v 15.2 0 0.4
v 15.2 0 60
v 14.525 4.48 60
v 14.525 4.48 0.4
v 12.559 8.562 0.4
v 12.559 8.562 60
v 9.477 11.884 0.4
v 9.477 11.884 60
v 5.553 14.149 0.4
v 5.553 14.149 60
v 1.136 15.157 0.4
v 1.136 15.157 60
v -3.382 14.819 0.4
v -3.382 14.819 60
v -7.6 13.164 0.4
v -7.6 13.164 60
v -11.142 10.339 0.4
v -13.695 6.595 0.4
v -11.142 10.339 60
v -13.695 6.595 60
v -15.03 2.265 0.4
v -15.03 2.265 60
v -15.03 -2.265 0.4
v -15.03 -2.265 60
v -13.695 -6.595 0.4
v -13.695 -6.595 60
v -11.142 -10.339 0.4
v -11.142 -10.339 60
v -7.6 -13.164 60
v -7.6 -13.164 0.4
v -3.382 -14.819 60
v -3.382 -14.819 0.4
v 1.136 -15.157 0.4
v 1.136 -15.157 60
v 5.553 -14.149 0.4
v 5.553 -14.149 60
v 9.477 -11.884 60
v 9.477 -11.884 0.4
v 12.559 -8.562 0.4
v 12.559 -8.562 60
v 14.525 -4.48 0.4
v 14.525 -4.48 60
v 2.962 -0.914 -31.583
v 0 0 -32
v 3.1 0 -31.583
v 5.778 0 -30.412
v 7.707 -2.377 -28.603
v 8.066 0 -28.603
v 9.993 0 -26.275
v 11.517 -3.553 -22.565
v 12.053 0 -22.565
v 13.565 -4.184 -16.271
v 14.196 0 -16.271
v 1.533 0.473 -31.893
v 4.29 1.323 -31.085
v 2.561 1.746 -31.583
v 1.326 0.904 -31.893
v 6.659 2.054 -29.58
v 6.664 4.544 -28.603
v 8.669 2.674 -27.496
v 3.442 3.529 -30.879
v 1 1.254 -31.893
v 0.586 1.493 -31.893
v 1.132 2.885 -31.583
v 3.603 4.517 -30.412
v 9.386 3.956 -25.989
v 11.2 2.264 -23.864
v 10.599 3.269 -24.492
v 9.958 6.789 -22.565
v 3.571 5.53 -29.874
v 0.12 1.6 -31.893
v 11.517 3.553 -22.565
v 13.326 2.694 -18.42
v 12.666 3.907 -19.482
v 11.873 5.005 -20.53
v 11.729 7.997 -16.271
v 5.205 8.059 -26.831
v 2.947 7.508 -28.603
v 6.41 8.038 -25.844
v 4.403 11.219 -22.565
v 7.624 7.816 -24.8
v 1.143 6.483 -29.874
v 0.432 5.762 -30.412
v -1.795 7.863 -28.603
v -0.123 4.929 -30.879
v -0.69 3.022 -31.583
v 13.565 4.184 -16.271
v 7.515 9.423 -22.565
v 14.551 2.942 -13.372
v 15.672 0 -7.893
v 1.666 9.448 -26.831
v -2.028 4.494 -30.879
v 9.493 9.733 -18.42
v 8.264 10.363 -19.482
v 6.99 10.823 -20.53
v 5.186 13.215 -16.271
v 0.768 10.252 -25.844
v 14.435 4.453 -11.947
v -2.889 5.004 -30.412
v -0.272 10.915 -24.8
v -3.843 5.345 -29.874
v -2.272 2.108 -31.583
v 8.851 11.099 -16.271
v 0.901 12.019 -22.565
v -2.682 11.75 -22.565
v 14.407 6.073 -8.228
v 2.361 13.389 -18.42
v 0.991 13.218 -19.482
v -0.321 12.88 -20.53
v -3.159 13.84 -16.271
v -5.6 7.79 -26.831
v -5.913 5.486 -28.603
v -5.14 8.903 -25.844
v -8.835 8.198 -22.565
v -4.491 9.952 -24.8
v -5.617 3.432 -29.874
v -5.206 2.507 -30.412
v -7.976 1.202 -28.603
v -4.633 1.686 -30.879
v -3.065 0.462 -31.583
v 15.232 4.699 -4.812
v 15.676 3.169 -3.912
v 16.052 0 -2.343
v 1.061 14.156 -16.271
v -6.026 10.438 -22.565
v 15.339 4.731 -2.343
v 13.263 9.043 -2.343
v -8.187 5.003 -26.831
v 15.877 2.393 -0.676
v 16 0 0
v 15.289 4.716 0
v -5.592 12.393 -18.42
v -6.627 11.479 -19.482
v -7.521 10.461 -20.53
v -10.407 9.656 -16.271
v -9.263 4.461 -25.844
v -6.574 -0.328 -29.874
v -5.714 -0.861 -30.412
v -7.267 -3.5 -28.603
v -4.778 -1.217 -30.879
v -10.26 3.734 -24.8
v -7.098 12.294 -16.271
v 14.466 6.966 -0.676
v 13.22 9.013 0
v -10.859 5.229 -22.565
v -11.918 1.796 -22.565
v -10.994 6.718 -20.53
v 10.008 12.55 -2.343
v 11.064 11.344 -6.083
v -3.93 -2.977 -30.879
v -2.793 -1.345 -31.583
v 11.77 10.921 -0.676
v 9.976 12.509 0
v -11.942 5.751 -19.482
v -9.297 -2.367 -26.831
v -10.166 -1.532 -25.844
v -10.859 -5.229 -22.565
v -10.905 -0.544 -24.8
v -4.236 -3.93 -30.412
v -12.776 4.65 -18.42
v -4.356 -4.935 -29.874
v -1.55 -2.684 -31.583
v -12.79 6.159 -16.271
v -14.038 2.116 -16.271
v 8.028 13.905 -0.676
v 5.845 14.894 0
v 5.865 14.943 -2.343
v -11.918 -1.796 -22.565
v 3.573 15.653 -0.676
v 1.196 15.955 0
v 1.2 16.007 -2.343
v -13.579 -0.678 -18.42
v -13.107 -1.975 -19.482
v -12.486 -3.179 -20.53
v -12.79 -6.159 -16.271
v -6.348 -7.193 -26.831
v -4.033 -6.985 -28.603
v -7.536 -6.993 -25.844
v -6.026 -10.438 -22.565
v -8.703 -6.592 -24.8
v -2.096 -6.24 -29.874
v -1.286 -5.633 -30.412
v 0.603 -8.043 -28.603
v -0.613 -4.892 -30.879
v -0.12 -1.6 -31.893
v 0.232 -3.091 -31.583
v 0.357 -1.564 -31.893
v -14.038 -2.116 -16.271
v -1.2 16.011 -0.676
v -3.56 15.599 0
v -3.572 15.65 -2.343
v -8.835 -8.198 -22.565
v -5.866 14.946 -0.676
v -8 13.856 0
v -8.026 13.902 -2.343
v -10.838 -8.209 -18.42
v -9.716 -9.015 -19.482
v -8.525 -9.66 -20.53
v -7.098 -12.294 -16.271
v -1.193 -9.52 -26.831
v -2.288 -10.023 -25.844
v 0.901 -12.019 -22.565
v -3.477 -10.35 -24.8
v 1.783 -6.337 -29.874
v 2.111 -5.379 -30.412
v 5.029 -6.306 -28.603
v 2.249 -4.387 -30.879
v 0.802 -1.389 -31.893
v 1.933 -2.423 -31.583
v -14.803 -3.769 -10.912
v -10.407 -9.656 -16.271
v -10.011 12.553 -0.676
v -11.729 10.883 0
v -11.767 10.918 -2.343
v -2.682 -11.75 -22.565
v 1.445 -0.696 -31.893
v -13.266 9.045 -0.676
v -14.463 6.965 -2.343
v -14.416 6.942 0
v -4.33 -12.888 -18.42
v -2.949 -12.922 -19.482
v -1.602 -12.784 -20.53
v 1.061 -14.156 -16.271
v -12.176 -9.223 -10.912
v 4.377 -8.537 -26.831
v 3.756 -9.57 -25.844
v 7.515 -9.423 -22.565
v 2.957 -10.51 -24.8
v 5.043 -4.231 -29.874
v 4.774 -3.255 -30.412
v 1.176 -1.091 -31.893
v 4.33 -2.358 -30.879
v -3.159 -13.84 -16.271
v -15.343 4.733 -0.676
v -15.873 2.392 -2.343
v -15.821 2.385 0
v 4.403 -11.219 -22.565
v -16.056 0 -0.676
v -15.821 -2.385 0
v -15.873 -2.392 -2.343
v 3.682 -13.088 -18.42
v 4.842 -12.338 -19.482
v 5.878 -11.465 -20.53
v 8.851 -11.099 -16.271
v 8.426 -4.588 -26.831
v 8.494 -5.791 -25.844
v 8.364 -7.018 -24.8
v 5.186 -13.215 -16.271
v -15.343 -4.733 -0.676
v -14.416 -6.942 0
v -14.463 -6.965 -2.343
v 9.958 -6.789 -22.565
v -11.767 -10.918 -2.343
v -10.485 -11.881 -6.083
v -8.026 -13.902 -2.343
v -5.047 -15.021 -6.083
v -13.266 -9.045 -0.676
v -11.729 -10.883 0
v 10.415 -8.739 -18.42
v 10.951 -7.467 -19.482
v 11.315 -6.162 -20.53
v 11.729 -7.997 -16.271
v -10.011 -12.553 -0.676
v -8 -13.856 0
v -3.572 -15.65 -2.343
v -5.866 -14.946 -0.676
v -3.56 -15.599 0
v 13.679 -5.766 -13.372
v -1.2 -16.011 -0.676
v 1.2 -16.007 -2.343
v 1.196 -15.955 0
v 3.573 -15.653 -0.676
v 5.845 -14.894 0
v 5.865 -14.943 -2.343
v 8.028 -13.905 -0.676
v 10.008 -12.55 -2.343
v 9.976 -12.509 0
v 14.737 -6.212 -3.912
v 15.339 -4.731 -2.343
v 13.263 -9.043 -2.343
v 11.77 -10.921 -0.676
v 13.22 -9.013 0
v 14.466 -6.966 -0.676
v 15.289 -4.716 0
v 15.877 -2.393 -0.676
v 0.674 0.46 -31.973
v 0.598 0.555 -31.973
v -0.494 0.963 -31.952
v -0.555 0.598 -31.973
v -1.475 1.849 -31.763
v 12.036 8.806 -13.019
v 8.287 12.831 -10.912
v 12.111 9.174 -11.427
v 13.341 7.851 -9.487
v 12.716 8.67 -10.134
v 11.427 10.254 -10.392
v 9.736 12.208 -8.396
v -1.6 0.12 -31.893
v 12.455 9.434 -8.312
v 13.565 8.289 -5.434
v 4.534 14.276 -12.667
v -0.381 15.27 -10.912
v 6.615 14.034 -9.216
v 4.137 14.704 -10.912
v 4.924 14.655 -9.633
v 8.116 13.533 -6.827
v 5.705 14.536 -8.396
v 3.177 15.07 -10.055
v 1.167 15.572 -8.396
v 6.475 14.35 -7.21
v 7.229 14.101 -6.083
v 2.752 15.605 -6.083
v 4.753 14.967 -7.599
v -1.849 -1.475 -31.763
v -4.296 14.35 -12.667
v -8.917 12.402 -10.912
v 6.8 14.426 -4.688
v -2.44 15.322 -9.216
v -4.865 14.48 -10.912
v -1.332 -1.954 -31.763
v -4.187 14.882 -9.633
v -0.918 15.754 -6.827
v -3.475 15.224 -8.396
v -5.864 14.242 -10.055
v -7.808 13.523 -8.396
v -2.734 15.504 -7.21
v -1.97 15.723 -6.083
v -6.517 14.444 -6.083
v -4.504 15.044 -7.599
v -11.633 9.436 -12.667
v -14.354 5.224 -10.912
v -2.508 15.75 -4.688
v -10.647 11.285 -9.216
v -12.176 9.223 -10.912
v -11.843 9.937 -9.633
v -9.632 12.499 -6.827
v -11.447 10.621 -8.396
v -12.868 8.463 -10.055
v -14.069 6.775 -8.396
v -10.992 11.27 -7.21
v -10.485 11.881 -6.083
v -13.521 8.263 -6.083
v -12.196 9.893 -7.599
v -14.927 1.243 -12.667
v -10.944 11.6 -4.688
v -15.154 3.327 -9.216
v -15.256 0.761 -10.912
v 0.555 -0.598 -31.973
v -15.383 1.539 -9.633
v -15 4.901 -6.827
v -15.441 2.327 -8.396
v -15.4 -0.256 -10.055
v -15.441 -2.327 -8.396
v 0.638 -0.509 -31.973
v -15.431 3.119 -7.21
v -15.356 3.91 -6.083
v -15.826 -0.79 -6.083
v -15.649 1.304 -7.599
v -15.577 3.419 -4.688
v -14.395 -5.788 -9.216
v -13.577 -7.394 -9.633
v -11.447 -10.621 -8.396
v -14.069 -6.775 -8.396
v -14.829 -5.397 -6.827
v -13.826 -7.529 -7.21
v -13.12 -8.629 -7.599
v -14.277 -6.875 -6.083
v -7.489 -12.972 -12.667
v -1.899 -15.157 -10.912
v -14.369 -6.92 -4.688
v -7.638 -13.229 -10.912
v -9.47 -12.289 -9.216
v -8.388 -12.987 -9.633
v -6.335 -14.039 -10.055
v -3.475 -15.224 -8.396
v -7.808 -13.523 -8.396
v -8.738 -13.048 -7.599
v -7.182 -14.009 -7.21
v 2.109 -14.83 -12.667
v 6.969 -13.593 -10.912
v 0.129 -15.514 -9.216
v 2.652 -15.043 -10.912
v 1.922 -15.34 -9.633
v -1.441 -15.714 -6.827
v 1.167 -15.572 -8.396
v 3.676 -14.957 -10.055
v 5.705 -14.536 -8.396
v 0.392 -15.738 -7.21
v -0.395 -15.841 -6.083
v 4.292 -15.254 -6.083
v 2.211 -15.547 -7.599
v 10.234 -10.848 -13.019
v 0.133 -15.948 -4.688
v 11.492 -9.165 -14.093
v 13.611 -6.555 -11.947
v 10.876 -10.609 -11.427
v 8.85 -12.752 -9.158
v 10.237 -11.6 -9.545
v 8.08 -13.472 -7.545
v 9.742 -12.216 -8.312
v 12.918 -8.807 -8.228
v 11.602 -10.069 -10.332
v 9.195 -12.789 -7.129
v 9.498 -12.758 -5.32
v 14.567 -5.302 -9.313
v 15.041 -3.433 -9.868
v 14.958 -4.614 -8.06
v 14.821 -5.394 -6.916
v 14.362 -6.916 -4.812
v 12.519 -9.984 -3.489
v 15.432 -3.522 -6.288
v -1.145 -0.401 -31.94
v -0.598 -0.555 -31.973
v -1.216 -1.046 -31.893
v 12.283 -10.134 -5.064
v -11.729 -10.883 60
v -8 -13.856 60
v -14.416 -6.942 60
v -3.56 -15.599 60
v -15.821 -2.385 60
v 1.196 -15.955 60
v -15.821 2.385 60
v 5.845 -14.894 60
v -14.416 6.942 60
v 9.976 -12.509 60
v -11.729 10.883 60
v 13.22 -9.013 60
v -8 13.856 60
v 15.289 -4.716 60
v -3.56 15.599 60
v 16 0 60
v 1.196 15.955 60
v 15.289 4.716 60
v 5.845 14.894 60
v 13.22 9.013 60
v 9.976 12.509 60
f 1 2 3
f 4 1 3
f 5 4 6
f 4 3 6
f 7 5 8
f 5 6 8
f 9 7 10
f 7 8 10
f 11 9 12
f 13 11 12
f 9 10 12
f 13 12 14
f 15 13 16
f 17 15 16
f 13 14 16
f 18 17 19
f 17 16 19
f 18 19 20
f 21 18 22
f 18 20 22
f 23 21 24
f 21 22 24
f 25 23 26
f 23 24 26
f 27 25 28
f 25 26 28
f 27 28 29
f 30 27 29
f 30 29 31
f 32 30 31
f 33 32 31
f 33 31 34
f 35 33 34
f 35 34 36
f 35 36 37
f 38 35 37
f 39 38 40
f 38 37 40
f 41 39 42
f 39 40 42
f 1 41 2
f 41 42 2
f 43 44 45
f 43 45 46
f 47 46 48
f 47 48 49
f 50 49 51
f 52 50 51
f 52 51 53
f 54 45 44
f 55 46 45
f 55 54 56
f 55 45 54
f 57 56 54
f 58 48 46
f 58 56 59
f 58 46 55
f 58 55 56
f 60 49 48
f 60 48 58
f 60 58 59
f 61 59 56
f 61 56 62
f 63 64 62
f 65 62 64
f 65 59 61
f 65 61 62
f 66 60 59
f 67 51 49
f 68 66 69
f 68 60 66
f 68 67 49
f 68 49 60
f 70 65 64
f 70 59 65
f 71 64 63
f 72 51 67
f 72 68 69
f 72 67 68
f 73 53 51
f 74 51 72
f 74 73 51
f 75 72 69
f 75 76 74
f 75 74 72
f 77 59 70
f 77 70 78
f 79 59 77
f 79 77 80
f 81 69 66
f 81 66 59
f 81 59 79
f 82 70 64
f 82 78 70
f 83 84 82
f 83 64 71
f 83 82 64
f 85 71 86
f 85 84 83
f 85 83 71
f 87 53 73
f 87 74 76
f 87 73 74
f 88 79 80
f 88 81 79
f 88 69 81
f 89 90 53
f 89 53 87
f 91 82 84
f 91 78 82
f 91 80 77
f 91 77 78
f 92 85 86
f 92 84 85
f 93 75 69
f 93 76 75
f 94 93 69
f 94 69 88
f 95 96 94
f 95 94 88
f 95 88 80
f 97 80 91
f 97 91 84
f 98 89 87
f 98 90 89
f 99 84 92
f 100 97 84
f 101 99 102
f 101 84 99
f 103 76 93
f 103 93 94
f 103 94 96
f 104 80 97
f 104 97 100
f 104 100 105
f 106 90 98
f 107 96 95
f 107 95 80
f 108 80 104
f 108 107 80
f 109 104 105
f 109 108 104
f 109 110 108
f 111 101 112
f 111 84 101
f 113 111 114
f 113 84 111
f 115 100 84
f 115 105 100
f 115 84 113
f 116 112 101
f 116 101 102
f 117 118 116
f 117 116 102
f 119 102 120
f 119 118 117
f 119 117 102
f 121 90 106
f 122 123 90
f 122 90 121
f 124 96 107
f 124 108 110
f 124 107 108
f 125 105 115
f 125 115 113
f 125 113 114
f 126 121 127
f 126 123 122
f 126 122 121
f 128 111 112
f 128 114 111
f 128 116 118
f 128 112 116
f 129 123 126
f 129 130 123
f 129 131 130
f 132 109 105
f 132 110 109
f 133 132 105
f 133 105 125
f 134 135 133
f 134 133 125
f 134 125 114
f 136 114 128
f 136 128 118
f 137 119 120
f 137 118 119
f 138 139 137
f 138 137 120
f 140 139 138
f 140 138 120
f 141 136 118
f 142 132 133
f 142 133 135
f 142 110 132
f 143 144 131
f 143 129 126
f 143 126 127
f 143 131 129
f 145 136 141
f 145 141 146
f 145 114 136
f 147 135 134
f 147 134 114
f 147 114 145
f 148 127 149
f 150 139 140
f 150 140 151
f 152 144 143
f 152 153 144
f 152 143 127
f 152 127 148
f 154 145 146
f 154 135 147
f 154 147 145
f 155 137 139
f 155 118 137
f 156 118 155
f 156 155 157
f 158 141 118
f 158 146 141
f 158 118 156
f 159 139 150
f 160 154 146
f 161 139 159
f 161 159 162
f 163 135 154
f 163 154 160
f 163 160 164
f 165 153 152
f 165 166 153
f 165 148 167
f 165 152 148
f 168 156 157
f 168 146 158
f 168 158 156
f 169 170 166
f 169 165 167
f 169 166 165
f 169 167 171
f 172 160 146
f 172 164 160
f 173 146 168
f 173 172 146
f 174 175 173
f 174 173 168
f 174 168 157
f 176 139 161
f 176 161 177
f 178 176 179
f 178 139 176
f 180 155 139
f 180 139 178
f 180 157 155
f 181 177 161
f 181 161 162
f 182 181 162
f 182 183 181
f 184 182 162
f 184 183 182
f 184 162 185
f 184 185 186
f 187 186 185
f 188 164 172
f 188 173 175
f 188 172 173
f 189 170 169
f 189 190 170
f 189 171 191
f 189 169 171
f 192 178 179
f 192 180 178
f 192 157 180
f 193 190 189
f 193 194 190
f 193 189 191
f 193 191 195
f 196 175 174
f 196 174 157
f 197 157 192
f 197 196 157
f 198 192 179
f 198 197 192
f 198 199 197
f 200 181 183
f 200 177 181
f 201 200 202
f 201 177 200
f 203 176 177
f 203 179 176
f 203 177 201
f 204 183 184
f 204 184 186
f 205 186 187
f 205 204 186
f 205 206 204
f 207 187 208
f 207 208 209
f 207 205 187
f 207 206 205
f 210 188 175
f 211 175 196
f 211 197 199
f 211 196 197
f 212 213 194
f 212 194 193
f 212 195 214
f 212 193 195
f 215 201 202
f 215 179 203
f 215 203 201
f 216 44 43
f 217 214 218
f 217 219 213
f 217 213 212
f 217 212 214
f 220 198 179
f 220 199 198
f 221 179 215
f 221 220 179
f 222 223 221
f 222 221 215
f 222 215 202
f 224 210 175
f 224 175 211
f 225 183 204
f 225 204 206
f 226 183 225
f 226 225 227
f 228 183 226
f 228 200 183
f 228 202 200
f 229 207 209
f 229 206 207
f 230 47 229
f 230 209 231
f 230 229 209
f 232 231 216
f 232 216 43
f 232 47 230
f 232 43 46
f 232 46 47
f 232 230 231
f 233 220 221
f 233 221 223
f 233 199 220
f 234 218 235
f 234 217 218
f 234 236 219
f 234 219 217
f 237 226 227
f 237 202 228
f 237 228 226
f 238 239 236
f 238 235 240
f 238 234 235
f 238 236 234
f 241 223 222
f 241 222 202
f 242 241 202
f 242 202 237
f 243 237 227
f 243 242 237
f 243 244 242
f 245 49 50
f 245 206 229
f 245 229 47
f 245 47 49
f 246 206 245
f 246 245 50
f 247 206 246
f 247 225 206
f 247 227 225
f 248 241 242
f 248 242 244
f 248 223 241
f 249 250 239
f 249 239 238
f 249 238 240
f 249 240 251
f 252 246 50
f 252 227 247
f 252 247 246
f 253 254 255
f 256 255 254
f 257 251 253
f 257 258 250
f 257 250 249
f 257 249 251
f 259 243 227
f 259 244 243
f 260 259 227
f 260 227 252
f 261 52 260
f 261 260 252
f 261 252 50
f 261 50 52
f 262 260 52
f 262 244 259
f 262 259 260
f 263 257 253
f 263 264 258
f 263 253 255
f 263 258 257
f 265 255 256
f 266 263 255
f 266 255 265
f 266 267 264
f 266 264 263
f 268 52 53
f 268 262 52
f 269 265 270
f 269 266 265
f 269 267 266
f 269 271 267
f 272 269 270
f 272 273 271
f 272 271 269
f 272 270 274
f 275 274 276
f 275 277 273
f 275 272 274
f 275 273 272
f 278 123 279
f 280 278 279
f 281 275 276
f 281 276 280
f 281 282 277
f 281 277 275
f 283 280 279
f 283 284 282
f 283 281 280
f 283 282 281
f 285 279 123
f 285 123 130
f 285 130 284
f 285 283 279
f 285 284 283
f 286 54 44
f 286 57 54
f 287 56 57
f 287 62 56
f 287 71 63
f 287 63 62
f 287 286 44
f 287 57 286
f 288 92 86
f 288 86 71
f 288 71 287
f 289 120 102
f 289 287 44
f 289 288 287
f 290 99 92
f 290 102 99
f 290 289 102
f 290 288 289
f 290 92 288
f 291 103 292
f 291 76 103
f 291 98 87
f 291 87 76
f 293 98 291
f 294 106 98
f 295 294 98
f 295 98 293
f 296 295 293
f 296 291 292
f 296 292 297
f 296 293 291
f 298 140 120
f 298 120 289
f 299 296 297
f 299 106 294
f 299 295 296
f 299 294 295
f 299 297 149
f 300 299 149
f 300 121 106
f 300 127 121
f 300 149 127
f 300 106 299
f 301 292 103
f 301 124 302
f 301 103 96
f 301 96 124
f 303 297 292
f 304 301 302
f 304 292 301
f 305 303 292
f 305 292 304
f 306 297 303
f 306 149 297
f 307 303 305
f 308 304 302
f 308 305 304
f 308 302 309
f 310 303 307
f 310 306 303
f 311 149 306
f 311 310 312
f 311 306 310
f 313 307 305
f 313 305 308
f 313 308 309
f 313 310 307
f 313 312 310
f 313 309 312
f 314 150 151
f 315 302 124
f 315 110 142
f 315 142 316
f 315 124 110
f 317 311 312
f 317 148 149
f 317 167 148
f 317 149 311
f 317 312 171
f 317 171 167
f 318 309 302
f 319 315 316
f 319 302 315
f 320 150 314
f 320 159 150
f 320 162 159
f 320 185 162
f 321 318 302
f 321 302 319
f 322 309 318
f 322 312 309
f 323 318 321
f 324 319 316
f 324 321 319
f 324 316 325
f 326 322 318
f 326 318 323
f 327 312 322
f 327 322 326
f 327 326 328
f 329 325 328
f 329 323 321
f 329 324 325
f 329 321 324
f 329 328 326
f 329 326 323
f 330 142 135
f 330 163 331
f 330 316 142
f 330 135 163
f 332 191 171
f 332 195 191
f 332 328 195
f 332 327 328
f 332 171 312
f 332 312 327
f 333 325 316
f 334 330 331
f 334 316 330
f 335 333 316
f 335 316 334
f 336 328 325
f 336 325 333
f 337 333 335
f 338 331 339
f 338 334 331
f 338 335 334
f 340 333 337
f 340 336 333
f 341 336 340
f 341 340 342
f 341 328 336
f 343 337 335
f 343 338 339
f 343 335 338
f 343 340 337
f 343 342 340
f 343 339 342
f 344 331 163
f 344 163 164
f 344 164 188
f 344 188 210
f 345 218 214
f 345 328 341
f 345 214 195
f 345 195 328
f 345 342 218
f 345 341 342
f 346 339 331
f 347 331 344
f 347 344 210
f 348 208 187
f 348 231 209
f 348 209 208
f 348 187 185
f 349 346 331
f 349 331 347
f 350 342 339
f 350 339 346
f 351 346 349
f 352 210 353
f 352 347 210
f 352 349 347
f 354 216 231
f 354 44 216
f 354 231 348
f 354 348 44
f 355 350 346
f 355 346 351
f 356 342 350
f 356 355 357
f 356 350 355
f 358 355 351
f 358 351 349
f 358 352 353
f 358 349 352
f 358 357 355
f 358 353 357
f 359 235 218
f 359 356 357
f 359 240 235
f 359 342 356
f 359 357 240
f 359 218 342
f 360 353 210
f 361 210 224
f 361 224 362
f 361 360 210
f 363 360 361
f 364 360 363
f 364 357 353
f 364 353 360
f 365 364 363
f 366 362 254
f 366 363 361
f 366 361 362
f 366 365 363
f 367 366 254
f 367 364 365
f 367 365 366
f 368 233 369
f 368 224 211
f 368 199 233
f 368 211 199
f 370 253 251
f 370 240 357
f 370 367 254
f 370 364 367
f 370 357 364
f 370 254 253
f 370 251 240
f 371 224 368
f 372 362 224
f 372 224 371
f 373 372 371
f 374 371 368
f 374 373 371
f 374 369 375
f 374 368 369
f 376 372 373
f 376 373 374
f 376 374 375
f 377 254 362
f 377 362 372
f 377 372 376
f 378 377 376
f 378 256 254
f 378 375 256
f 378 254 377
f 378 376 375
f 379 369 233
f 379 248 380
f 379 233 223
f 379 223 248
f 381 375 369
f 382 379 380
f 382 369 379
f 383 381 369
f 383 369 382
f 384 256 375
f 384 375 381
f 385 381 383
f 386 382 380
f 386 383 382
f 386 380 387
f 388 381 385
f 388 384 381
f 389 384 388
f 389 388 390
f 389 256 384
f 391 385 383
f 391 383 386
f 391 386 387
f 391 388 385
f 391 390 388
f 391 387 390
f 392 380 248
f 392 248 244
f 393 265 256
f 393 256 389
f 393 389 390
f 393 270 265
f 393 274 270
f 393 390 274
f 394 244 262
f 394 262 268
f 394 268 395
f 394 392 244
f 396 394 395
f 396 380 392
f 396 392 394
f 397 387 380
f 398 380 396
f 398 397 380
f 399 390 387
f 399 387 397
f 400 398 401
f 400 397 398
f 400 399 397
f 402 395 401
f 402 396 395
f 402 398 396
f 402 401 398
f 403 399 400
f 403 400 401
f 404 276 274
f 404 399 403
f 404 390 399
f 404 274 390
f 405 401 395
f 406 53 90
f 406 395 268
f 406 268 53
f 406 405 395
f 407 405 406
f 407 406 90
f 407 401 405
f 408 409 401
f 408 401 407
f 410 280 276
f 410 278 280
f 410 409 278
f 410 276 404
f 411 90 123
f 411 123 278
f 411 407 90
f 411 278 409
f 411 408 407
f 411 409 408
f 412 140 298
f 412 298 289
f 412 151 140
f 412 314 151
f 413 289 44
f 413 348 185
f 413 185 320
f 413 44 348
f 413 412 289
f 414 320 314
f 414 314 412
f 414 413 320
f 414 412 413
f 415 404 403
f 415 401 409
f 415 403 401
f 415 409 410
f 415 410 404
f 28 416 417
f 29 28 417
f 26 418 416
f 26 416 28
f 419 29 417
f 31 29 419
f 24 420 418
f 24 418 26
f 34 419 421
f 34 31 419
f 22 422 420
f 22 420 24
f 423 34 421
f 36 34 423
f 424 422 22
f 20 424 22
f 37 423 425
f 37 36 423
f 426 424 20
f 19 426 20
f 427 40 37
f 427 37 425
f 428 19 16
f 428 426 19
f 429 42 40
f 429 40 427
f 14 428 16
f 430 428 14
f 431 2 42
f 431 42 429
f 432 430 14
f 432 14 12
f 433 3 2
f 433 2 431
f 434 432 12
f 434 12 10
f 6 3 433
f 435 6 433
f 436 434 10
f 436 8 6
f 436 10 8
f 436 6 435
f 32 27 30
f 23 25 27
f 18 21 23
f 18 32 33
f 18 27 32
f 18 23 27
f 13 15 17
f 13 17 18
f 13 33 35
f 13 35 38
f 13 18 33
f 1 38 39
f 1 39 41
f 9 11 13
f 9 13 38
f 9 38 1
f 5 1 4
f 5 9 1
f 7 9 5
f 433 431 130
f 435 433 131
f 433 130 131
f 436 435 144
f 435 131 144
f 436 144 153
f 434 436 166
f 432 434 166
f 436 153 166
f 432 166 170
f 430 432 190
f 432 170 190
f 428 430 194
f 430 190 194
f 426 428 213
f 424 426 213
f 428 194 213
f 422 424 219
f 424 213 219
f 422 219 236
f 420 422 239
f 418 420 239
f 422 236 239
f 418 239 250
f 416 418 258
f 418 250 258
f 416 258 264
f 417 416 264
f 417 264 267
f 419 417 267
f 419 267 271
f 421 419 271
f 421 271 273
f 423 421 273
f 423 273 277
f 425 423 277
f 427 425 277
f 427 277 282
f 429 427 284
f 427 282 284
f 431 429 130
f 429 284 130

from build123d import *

# Parameters (mm, degrees)
F0_R     = 16
F1_DEPTH = 60
F2_R     = 15.2
F3_DEPTH = 59.6


with BuildPart() as f1:
    # F0 (on Top) → F1 (new body)
    with BuildSketch(Plane.XY):
        Circle(F0_R)
    extrude(amount=F1_DEPTH)

    # F2 (on face) → F3 (cut)
    with BuildSketch(Plane.XY.offset(60)):
        Circle(F2_R)
    extrude(amount=-F3_DEPTH, mode=Mode.SUBTRACT)

    # F5 (on Front) → F7 (revolve)
    with BuildSketch(Plane.XZ):
        with BuildLine():
            Line((0, 0), (0, -32))
            add(Edge.make_bspline(
                [(0, -32), (16.291009, -32), (16.291009, -0.489182), (16, 0)],
                knots=[0, 0, 0, 0, 35.777088, 35.777088, 35.777088, 35.777088], degree=3))
            Line((16, 0), (0, 0))
        make_face()
    revolve(axis=Axis((0, 0, 19.230902), (0, 0, 1)))


solid = f1.part
